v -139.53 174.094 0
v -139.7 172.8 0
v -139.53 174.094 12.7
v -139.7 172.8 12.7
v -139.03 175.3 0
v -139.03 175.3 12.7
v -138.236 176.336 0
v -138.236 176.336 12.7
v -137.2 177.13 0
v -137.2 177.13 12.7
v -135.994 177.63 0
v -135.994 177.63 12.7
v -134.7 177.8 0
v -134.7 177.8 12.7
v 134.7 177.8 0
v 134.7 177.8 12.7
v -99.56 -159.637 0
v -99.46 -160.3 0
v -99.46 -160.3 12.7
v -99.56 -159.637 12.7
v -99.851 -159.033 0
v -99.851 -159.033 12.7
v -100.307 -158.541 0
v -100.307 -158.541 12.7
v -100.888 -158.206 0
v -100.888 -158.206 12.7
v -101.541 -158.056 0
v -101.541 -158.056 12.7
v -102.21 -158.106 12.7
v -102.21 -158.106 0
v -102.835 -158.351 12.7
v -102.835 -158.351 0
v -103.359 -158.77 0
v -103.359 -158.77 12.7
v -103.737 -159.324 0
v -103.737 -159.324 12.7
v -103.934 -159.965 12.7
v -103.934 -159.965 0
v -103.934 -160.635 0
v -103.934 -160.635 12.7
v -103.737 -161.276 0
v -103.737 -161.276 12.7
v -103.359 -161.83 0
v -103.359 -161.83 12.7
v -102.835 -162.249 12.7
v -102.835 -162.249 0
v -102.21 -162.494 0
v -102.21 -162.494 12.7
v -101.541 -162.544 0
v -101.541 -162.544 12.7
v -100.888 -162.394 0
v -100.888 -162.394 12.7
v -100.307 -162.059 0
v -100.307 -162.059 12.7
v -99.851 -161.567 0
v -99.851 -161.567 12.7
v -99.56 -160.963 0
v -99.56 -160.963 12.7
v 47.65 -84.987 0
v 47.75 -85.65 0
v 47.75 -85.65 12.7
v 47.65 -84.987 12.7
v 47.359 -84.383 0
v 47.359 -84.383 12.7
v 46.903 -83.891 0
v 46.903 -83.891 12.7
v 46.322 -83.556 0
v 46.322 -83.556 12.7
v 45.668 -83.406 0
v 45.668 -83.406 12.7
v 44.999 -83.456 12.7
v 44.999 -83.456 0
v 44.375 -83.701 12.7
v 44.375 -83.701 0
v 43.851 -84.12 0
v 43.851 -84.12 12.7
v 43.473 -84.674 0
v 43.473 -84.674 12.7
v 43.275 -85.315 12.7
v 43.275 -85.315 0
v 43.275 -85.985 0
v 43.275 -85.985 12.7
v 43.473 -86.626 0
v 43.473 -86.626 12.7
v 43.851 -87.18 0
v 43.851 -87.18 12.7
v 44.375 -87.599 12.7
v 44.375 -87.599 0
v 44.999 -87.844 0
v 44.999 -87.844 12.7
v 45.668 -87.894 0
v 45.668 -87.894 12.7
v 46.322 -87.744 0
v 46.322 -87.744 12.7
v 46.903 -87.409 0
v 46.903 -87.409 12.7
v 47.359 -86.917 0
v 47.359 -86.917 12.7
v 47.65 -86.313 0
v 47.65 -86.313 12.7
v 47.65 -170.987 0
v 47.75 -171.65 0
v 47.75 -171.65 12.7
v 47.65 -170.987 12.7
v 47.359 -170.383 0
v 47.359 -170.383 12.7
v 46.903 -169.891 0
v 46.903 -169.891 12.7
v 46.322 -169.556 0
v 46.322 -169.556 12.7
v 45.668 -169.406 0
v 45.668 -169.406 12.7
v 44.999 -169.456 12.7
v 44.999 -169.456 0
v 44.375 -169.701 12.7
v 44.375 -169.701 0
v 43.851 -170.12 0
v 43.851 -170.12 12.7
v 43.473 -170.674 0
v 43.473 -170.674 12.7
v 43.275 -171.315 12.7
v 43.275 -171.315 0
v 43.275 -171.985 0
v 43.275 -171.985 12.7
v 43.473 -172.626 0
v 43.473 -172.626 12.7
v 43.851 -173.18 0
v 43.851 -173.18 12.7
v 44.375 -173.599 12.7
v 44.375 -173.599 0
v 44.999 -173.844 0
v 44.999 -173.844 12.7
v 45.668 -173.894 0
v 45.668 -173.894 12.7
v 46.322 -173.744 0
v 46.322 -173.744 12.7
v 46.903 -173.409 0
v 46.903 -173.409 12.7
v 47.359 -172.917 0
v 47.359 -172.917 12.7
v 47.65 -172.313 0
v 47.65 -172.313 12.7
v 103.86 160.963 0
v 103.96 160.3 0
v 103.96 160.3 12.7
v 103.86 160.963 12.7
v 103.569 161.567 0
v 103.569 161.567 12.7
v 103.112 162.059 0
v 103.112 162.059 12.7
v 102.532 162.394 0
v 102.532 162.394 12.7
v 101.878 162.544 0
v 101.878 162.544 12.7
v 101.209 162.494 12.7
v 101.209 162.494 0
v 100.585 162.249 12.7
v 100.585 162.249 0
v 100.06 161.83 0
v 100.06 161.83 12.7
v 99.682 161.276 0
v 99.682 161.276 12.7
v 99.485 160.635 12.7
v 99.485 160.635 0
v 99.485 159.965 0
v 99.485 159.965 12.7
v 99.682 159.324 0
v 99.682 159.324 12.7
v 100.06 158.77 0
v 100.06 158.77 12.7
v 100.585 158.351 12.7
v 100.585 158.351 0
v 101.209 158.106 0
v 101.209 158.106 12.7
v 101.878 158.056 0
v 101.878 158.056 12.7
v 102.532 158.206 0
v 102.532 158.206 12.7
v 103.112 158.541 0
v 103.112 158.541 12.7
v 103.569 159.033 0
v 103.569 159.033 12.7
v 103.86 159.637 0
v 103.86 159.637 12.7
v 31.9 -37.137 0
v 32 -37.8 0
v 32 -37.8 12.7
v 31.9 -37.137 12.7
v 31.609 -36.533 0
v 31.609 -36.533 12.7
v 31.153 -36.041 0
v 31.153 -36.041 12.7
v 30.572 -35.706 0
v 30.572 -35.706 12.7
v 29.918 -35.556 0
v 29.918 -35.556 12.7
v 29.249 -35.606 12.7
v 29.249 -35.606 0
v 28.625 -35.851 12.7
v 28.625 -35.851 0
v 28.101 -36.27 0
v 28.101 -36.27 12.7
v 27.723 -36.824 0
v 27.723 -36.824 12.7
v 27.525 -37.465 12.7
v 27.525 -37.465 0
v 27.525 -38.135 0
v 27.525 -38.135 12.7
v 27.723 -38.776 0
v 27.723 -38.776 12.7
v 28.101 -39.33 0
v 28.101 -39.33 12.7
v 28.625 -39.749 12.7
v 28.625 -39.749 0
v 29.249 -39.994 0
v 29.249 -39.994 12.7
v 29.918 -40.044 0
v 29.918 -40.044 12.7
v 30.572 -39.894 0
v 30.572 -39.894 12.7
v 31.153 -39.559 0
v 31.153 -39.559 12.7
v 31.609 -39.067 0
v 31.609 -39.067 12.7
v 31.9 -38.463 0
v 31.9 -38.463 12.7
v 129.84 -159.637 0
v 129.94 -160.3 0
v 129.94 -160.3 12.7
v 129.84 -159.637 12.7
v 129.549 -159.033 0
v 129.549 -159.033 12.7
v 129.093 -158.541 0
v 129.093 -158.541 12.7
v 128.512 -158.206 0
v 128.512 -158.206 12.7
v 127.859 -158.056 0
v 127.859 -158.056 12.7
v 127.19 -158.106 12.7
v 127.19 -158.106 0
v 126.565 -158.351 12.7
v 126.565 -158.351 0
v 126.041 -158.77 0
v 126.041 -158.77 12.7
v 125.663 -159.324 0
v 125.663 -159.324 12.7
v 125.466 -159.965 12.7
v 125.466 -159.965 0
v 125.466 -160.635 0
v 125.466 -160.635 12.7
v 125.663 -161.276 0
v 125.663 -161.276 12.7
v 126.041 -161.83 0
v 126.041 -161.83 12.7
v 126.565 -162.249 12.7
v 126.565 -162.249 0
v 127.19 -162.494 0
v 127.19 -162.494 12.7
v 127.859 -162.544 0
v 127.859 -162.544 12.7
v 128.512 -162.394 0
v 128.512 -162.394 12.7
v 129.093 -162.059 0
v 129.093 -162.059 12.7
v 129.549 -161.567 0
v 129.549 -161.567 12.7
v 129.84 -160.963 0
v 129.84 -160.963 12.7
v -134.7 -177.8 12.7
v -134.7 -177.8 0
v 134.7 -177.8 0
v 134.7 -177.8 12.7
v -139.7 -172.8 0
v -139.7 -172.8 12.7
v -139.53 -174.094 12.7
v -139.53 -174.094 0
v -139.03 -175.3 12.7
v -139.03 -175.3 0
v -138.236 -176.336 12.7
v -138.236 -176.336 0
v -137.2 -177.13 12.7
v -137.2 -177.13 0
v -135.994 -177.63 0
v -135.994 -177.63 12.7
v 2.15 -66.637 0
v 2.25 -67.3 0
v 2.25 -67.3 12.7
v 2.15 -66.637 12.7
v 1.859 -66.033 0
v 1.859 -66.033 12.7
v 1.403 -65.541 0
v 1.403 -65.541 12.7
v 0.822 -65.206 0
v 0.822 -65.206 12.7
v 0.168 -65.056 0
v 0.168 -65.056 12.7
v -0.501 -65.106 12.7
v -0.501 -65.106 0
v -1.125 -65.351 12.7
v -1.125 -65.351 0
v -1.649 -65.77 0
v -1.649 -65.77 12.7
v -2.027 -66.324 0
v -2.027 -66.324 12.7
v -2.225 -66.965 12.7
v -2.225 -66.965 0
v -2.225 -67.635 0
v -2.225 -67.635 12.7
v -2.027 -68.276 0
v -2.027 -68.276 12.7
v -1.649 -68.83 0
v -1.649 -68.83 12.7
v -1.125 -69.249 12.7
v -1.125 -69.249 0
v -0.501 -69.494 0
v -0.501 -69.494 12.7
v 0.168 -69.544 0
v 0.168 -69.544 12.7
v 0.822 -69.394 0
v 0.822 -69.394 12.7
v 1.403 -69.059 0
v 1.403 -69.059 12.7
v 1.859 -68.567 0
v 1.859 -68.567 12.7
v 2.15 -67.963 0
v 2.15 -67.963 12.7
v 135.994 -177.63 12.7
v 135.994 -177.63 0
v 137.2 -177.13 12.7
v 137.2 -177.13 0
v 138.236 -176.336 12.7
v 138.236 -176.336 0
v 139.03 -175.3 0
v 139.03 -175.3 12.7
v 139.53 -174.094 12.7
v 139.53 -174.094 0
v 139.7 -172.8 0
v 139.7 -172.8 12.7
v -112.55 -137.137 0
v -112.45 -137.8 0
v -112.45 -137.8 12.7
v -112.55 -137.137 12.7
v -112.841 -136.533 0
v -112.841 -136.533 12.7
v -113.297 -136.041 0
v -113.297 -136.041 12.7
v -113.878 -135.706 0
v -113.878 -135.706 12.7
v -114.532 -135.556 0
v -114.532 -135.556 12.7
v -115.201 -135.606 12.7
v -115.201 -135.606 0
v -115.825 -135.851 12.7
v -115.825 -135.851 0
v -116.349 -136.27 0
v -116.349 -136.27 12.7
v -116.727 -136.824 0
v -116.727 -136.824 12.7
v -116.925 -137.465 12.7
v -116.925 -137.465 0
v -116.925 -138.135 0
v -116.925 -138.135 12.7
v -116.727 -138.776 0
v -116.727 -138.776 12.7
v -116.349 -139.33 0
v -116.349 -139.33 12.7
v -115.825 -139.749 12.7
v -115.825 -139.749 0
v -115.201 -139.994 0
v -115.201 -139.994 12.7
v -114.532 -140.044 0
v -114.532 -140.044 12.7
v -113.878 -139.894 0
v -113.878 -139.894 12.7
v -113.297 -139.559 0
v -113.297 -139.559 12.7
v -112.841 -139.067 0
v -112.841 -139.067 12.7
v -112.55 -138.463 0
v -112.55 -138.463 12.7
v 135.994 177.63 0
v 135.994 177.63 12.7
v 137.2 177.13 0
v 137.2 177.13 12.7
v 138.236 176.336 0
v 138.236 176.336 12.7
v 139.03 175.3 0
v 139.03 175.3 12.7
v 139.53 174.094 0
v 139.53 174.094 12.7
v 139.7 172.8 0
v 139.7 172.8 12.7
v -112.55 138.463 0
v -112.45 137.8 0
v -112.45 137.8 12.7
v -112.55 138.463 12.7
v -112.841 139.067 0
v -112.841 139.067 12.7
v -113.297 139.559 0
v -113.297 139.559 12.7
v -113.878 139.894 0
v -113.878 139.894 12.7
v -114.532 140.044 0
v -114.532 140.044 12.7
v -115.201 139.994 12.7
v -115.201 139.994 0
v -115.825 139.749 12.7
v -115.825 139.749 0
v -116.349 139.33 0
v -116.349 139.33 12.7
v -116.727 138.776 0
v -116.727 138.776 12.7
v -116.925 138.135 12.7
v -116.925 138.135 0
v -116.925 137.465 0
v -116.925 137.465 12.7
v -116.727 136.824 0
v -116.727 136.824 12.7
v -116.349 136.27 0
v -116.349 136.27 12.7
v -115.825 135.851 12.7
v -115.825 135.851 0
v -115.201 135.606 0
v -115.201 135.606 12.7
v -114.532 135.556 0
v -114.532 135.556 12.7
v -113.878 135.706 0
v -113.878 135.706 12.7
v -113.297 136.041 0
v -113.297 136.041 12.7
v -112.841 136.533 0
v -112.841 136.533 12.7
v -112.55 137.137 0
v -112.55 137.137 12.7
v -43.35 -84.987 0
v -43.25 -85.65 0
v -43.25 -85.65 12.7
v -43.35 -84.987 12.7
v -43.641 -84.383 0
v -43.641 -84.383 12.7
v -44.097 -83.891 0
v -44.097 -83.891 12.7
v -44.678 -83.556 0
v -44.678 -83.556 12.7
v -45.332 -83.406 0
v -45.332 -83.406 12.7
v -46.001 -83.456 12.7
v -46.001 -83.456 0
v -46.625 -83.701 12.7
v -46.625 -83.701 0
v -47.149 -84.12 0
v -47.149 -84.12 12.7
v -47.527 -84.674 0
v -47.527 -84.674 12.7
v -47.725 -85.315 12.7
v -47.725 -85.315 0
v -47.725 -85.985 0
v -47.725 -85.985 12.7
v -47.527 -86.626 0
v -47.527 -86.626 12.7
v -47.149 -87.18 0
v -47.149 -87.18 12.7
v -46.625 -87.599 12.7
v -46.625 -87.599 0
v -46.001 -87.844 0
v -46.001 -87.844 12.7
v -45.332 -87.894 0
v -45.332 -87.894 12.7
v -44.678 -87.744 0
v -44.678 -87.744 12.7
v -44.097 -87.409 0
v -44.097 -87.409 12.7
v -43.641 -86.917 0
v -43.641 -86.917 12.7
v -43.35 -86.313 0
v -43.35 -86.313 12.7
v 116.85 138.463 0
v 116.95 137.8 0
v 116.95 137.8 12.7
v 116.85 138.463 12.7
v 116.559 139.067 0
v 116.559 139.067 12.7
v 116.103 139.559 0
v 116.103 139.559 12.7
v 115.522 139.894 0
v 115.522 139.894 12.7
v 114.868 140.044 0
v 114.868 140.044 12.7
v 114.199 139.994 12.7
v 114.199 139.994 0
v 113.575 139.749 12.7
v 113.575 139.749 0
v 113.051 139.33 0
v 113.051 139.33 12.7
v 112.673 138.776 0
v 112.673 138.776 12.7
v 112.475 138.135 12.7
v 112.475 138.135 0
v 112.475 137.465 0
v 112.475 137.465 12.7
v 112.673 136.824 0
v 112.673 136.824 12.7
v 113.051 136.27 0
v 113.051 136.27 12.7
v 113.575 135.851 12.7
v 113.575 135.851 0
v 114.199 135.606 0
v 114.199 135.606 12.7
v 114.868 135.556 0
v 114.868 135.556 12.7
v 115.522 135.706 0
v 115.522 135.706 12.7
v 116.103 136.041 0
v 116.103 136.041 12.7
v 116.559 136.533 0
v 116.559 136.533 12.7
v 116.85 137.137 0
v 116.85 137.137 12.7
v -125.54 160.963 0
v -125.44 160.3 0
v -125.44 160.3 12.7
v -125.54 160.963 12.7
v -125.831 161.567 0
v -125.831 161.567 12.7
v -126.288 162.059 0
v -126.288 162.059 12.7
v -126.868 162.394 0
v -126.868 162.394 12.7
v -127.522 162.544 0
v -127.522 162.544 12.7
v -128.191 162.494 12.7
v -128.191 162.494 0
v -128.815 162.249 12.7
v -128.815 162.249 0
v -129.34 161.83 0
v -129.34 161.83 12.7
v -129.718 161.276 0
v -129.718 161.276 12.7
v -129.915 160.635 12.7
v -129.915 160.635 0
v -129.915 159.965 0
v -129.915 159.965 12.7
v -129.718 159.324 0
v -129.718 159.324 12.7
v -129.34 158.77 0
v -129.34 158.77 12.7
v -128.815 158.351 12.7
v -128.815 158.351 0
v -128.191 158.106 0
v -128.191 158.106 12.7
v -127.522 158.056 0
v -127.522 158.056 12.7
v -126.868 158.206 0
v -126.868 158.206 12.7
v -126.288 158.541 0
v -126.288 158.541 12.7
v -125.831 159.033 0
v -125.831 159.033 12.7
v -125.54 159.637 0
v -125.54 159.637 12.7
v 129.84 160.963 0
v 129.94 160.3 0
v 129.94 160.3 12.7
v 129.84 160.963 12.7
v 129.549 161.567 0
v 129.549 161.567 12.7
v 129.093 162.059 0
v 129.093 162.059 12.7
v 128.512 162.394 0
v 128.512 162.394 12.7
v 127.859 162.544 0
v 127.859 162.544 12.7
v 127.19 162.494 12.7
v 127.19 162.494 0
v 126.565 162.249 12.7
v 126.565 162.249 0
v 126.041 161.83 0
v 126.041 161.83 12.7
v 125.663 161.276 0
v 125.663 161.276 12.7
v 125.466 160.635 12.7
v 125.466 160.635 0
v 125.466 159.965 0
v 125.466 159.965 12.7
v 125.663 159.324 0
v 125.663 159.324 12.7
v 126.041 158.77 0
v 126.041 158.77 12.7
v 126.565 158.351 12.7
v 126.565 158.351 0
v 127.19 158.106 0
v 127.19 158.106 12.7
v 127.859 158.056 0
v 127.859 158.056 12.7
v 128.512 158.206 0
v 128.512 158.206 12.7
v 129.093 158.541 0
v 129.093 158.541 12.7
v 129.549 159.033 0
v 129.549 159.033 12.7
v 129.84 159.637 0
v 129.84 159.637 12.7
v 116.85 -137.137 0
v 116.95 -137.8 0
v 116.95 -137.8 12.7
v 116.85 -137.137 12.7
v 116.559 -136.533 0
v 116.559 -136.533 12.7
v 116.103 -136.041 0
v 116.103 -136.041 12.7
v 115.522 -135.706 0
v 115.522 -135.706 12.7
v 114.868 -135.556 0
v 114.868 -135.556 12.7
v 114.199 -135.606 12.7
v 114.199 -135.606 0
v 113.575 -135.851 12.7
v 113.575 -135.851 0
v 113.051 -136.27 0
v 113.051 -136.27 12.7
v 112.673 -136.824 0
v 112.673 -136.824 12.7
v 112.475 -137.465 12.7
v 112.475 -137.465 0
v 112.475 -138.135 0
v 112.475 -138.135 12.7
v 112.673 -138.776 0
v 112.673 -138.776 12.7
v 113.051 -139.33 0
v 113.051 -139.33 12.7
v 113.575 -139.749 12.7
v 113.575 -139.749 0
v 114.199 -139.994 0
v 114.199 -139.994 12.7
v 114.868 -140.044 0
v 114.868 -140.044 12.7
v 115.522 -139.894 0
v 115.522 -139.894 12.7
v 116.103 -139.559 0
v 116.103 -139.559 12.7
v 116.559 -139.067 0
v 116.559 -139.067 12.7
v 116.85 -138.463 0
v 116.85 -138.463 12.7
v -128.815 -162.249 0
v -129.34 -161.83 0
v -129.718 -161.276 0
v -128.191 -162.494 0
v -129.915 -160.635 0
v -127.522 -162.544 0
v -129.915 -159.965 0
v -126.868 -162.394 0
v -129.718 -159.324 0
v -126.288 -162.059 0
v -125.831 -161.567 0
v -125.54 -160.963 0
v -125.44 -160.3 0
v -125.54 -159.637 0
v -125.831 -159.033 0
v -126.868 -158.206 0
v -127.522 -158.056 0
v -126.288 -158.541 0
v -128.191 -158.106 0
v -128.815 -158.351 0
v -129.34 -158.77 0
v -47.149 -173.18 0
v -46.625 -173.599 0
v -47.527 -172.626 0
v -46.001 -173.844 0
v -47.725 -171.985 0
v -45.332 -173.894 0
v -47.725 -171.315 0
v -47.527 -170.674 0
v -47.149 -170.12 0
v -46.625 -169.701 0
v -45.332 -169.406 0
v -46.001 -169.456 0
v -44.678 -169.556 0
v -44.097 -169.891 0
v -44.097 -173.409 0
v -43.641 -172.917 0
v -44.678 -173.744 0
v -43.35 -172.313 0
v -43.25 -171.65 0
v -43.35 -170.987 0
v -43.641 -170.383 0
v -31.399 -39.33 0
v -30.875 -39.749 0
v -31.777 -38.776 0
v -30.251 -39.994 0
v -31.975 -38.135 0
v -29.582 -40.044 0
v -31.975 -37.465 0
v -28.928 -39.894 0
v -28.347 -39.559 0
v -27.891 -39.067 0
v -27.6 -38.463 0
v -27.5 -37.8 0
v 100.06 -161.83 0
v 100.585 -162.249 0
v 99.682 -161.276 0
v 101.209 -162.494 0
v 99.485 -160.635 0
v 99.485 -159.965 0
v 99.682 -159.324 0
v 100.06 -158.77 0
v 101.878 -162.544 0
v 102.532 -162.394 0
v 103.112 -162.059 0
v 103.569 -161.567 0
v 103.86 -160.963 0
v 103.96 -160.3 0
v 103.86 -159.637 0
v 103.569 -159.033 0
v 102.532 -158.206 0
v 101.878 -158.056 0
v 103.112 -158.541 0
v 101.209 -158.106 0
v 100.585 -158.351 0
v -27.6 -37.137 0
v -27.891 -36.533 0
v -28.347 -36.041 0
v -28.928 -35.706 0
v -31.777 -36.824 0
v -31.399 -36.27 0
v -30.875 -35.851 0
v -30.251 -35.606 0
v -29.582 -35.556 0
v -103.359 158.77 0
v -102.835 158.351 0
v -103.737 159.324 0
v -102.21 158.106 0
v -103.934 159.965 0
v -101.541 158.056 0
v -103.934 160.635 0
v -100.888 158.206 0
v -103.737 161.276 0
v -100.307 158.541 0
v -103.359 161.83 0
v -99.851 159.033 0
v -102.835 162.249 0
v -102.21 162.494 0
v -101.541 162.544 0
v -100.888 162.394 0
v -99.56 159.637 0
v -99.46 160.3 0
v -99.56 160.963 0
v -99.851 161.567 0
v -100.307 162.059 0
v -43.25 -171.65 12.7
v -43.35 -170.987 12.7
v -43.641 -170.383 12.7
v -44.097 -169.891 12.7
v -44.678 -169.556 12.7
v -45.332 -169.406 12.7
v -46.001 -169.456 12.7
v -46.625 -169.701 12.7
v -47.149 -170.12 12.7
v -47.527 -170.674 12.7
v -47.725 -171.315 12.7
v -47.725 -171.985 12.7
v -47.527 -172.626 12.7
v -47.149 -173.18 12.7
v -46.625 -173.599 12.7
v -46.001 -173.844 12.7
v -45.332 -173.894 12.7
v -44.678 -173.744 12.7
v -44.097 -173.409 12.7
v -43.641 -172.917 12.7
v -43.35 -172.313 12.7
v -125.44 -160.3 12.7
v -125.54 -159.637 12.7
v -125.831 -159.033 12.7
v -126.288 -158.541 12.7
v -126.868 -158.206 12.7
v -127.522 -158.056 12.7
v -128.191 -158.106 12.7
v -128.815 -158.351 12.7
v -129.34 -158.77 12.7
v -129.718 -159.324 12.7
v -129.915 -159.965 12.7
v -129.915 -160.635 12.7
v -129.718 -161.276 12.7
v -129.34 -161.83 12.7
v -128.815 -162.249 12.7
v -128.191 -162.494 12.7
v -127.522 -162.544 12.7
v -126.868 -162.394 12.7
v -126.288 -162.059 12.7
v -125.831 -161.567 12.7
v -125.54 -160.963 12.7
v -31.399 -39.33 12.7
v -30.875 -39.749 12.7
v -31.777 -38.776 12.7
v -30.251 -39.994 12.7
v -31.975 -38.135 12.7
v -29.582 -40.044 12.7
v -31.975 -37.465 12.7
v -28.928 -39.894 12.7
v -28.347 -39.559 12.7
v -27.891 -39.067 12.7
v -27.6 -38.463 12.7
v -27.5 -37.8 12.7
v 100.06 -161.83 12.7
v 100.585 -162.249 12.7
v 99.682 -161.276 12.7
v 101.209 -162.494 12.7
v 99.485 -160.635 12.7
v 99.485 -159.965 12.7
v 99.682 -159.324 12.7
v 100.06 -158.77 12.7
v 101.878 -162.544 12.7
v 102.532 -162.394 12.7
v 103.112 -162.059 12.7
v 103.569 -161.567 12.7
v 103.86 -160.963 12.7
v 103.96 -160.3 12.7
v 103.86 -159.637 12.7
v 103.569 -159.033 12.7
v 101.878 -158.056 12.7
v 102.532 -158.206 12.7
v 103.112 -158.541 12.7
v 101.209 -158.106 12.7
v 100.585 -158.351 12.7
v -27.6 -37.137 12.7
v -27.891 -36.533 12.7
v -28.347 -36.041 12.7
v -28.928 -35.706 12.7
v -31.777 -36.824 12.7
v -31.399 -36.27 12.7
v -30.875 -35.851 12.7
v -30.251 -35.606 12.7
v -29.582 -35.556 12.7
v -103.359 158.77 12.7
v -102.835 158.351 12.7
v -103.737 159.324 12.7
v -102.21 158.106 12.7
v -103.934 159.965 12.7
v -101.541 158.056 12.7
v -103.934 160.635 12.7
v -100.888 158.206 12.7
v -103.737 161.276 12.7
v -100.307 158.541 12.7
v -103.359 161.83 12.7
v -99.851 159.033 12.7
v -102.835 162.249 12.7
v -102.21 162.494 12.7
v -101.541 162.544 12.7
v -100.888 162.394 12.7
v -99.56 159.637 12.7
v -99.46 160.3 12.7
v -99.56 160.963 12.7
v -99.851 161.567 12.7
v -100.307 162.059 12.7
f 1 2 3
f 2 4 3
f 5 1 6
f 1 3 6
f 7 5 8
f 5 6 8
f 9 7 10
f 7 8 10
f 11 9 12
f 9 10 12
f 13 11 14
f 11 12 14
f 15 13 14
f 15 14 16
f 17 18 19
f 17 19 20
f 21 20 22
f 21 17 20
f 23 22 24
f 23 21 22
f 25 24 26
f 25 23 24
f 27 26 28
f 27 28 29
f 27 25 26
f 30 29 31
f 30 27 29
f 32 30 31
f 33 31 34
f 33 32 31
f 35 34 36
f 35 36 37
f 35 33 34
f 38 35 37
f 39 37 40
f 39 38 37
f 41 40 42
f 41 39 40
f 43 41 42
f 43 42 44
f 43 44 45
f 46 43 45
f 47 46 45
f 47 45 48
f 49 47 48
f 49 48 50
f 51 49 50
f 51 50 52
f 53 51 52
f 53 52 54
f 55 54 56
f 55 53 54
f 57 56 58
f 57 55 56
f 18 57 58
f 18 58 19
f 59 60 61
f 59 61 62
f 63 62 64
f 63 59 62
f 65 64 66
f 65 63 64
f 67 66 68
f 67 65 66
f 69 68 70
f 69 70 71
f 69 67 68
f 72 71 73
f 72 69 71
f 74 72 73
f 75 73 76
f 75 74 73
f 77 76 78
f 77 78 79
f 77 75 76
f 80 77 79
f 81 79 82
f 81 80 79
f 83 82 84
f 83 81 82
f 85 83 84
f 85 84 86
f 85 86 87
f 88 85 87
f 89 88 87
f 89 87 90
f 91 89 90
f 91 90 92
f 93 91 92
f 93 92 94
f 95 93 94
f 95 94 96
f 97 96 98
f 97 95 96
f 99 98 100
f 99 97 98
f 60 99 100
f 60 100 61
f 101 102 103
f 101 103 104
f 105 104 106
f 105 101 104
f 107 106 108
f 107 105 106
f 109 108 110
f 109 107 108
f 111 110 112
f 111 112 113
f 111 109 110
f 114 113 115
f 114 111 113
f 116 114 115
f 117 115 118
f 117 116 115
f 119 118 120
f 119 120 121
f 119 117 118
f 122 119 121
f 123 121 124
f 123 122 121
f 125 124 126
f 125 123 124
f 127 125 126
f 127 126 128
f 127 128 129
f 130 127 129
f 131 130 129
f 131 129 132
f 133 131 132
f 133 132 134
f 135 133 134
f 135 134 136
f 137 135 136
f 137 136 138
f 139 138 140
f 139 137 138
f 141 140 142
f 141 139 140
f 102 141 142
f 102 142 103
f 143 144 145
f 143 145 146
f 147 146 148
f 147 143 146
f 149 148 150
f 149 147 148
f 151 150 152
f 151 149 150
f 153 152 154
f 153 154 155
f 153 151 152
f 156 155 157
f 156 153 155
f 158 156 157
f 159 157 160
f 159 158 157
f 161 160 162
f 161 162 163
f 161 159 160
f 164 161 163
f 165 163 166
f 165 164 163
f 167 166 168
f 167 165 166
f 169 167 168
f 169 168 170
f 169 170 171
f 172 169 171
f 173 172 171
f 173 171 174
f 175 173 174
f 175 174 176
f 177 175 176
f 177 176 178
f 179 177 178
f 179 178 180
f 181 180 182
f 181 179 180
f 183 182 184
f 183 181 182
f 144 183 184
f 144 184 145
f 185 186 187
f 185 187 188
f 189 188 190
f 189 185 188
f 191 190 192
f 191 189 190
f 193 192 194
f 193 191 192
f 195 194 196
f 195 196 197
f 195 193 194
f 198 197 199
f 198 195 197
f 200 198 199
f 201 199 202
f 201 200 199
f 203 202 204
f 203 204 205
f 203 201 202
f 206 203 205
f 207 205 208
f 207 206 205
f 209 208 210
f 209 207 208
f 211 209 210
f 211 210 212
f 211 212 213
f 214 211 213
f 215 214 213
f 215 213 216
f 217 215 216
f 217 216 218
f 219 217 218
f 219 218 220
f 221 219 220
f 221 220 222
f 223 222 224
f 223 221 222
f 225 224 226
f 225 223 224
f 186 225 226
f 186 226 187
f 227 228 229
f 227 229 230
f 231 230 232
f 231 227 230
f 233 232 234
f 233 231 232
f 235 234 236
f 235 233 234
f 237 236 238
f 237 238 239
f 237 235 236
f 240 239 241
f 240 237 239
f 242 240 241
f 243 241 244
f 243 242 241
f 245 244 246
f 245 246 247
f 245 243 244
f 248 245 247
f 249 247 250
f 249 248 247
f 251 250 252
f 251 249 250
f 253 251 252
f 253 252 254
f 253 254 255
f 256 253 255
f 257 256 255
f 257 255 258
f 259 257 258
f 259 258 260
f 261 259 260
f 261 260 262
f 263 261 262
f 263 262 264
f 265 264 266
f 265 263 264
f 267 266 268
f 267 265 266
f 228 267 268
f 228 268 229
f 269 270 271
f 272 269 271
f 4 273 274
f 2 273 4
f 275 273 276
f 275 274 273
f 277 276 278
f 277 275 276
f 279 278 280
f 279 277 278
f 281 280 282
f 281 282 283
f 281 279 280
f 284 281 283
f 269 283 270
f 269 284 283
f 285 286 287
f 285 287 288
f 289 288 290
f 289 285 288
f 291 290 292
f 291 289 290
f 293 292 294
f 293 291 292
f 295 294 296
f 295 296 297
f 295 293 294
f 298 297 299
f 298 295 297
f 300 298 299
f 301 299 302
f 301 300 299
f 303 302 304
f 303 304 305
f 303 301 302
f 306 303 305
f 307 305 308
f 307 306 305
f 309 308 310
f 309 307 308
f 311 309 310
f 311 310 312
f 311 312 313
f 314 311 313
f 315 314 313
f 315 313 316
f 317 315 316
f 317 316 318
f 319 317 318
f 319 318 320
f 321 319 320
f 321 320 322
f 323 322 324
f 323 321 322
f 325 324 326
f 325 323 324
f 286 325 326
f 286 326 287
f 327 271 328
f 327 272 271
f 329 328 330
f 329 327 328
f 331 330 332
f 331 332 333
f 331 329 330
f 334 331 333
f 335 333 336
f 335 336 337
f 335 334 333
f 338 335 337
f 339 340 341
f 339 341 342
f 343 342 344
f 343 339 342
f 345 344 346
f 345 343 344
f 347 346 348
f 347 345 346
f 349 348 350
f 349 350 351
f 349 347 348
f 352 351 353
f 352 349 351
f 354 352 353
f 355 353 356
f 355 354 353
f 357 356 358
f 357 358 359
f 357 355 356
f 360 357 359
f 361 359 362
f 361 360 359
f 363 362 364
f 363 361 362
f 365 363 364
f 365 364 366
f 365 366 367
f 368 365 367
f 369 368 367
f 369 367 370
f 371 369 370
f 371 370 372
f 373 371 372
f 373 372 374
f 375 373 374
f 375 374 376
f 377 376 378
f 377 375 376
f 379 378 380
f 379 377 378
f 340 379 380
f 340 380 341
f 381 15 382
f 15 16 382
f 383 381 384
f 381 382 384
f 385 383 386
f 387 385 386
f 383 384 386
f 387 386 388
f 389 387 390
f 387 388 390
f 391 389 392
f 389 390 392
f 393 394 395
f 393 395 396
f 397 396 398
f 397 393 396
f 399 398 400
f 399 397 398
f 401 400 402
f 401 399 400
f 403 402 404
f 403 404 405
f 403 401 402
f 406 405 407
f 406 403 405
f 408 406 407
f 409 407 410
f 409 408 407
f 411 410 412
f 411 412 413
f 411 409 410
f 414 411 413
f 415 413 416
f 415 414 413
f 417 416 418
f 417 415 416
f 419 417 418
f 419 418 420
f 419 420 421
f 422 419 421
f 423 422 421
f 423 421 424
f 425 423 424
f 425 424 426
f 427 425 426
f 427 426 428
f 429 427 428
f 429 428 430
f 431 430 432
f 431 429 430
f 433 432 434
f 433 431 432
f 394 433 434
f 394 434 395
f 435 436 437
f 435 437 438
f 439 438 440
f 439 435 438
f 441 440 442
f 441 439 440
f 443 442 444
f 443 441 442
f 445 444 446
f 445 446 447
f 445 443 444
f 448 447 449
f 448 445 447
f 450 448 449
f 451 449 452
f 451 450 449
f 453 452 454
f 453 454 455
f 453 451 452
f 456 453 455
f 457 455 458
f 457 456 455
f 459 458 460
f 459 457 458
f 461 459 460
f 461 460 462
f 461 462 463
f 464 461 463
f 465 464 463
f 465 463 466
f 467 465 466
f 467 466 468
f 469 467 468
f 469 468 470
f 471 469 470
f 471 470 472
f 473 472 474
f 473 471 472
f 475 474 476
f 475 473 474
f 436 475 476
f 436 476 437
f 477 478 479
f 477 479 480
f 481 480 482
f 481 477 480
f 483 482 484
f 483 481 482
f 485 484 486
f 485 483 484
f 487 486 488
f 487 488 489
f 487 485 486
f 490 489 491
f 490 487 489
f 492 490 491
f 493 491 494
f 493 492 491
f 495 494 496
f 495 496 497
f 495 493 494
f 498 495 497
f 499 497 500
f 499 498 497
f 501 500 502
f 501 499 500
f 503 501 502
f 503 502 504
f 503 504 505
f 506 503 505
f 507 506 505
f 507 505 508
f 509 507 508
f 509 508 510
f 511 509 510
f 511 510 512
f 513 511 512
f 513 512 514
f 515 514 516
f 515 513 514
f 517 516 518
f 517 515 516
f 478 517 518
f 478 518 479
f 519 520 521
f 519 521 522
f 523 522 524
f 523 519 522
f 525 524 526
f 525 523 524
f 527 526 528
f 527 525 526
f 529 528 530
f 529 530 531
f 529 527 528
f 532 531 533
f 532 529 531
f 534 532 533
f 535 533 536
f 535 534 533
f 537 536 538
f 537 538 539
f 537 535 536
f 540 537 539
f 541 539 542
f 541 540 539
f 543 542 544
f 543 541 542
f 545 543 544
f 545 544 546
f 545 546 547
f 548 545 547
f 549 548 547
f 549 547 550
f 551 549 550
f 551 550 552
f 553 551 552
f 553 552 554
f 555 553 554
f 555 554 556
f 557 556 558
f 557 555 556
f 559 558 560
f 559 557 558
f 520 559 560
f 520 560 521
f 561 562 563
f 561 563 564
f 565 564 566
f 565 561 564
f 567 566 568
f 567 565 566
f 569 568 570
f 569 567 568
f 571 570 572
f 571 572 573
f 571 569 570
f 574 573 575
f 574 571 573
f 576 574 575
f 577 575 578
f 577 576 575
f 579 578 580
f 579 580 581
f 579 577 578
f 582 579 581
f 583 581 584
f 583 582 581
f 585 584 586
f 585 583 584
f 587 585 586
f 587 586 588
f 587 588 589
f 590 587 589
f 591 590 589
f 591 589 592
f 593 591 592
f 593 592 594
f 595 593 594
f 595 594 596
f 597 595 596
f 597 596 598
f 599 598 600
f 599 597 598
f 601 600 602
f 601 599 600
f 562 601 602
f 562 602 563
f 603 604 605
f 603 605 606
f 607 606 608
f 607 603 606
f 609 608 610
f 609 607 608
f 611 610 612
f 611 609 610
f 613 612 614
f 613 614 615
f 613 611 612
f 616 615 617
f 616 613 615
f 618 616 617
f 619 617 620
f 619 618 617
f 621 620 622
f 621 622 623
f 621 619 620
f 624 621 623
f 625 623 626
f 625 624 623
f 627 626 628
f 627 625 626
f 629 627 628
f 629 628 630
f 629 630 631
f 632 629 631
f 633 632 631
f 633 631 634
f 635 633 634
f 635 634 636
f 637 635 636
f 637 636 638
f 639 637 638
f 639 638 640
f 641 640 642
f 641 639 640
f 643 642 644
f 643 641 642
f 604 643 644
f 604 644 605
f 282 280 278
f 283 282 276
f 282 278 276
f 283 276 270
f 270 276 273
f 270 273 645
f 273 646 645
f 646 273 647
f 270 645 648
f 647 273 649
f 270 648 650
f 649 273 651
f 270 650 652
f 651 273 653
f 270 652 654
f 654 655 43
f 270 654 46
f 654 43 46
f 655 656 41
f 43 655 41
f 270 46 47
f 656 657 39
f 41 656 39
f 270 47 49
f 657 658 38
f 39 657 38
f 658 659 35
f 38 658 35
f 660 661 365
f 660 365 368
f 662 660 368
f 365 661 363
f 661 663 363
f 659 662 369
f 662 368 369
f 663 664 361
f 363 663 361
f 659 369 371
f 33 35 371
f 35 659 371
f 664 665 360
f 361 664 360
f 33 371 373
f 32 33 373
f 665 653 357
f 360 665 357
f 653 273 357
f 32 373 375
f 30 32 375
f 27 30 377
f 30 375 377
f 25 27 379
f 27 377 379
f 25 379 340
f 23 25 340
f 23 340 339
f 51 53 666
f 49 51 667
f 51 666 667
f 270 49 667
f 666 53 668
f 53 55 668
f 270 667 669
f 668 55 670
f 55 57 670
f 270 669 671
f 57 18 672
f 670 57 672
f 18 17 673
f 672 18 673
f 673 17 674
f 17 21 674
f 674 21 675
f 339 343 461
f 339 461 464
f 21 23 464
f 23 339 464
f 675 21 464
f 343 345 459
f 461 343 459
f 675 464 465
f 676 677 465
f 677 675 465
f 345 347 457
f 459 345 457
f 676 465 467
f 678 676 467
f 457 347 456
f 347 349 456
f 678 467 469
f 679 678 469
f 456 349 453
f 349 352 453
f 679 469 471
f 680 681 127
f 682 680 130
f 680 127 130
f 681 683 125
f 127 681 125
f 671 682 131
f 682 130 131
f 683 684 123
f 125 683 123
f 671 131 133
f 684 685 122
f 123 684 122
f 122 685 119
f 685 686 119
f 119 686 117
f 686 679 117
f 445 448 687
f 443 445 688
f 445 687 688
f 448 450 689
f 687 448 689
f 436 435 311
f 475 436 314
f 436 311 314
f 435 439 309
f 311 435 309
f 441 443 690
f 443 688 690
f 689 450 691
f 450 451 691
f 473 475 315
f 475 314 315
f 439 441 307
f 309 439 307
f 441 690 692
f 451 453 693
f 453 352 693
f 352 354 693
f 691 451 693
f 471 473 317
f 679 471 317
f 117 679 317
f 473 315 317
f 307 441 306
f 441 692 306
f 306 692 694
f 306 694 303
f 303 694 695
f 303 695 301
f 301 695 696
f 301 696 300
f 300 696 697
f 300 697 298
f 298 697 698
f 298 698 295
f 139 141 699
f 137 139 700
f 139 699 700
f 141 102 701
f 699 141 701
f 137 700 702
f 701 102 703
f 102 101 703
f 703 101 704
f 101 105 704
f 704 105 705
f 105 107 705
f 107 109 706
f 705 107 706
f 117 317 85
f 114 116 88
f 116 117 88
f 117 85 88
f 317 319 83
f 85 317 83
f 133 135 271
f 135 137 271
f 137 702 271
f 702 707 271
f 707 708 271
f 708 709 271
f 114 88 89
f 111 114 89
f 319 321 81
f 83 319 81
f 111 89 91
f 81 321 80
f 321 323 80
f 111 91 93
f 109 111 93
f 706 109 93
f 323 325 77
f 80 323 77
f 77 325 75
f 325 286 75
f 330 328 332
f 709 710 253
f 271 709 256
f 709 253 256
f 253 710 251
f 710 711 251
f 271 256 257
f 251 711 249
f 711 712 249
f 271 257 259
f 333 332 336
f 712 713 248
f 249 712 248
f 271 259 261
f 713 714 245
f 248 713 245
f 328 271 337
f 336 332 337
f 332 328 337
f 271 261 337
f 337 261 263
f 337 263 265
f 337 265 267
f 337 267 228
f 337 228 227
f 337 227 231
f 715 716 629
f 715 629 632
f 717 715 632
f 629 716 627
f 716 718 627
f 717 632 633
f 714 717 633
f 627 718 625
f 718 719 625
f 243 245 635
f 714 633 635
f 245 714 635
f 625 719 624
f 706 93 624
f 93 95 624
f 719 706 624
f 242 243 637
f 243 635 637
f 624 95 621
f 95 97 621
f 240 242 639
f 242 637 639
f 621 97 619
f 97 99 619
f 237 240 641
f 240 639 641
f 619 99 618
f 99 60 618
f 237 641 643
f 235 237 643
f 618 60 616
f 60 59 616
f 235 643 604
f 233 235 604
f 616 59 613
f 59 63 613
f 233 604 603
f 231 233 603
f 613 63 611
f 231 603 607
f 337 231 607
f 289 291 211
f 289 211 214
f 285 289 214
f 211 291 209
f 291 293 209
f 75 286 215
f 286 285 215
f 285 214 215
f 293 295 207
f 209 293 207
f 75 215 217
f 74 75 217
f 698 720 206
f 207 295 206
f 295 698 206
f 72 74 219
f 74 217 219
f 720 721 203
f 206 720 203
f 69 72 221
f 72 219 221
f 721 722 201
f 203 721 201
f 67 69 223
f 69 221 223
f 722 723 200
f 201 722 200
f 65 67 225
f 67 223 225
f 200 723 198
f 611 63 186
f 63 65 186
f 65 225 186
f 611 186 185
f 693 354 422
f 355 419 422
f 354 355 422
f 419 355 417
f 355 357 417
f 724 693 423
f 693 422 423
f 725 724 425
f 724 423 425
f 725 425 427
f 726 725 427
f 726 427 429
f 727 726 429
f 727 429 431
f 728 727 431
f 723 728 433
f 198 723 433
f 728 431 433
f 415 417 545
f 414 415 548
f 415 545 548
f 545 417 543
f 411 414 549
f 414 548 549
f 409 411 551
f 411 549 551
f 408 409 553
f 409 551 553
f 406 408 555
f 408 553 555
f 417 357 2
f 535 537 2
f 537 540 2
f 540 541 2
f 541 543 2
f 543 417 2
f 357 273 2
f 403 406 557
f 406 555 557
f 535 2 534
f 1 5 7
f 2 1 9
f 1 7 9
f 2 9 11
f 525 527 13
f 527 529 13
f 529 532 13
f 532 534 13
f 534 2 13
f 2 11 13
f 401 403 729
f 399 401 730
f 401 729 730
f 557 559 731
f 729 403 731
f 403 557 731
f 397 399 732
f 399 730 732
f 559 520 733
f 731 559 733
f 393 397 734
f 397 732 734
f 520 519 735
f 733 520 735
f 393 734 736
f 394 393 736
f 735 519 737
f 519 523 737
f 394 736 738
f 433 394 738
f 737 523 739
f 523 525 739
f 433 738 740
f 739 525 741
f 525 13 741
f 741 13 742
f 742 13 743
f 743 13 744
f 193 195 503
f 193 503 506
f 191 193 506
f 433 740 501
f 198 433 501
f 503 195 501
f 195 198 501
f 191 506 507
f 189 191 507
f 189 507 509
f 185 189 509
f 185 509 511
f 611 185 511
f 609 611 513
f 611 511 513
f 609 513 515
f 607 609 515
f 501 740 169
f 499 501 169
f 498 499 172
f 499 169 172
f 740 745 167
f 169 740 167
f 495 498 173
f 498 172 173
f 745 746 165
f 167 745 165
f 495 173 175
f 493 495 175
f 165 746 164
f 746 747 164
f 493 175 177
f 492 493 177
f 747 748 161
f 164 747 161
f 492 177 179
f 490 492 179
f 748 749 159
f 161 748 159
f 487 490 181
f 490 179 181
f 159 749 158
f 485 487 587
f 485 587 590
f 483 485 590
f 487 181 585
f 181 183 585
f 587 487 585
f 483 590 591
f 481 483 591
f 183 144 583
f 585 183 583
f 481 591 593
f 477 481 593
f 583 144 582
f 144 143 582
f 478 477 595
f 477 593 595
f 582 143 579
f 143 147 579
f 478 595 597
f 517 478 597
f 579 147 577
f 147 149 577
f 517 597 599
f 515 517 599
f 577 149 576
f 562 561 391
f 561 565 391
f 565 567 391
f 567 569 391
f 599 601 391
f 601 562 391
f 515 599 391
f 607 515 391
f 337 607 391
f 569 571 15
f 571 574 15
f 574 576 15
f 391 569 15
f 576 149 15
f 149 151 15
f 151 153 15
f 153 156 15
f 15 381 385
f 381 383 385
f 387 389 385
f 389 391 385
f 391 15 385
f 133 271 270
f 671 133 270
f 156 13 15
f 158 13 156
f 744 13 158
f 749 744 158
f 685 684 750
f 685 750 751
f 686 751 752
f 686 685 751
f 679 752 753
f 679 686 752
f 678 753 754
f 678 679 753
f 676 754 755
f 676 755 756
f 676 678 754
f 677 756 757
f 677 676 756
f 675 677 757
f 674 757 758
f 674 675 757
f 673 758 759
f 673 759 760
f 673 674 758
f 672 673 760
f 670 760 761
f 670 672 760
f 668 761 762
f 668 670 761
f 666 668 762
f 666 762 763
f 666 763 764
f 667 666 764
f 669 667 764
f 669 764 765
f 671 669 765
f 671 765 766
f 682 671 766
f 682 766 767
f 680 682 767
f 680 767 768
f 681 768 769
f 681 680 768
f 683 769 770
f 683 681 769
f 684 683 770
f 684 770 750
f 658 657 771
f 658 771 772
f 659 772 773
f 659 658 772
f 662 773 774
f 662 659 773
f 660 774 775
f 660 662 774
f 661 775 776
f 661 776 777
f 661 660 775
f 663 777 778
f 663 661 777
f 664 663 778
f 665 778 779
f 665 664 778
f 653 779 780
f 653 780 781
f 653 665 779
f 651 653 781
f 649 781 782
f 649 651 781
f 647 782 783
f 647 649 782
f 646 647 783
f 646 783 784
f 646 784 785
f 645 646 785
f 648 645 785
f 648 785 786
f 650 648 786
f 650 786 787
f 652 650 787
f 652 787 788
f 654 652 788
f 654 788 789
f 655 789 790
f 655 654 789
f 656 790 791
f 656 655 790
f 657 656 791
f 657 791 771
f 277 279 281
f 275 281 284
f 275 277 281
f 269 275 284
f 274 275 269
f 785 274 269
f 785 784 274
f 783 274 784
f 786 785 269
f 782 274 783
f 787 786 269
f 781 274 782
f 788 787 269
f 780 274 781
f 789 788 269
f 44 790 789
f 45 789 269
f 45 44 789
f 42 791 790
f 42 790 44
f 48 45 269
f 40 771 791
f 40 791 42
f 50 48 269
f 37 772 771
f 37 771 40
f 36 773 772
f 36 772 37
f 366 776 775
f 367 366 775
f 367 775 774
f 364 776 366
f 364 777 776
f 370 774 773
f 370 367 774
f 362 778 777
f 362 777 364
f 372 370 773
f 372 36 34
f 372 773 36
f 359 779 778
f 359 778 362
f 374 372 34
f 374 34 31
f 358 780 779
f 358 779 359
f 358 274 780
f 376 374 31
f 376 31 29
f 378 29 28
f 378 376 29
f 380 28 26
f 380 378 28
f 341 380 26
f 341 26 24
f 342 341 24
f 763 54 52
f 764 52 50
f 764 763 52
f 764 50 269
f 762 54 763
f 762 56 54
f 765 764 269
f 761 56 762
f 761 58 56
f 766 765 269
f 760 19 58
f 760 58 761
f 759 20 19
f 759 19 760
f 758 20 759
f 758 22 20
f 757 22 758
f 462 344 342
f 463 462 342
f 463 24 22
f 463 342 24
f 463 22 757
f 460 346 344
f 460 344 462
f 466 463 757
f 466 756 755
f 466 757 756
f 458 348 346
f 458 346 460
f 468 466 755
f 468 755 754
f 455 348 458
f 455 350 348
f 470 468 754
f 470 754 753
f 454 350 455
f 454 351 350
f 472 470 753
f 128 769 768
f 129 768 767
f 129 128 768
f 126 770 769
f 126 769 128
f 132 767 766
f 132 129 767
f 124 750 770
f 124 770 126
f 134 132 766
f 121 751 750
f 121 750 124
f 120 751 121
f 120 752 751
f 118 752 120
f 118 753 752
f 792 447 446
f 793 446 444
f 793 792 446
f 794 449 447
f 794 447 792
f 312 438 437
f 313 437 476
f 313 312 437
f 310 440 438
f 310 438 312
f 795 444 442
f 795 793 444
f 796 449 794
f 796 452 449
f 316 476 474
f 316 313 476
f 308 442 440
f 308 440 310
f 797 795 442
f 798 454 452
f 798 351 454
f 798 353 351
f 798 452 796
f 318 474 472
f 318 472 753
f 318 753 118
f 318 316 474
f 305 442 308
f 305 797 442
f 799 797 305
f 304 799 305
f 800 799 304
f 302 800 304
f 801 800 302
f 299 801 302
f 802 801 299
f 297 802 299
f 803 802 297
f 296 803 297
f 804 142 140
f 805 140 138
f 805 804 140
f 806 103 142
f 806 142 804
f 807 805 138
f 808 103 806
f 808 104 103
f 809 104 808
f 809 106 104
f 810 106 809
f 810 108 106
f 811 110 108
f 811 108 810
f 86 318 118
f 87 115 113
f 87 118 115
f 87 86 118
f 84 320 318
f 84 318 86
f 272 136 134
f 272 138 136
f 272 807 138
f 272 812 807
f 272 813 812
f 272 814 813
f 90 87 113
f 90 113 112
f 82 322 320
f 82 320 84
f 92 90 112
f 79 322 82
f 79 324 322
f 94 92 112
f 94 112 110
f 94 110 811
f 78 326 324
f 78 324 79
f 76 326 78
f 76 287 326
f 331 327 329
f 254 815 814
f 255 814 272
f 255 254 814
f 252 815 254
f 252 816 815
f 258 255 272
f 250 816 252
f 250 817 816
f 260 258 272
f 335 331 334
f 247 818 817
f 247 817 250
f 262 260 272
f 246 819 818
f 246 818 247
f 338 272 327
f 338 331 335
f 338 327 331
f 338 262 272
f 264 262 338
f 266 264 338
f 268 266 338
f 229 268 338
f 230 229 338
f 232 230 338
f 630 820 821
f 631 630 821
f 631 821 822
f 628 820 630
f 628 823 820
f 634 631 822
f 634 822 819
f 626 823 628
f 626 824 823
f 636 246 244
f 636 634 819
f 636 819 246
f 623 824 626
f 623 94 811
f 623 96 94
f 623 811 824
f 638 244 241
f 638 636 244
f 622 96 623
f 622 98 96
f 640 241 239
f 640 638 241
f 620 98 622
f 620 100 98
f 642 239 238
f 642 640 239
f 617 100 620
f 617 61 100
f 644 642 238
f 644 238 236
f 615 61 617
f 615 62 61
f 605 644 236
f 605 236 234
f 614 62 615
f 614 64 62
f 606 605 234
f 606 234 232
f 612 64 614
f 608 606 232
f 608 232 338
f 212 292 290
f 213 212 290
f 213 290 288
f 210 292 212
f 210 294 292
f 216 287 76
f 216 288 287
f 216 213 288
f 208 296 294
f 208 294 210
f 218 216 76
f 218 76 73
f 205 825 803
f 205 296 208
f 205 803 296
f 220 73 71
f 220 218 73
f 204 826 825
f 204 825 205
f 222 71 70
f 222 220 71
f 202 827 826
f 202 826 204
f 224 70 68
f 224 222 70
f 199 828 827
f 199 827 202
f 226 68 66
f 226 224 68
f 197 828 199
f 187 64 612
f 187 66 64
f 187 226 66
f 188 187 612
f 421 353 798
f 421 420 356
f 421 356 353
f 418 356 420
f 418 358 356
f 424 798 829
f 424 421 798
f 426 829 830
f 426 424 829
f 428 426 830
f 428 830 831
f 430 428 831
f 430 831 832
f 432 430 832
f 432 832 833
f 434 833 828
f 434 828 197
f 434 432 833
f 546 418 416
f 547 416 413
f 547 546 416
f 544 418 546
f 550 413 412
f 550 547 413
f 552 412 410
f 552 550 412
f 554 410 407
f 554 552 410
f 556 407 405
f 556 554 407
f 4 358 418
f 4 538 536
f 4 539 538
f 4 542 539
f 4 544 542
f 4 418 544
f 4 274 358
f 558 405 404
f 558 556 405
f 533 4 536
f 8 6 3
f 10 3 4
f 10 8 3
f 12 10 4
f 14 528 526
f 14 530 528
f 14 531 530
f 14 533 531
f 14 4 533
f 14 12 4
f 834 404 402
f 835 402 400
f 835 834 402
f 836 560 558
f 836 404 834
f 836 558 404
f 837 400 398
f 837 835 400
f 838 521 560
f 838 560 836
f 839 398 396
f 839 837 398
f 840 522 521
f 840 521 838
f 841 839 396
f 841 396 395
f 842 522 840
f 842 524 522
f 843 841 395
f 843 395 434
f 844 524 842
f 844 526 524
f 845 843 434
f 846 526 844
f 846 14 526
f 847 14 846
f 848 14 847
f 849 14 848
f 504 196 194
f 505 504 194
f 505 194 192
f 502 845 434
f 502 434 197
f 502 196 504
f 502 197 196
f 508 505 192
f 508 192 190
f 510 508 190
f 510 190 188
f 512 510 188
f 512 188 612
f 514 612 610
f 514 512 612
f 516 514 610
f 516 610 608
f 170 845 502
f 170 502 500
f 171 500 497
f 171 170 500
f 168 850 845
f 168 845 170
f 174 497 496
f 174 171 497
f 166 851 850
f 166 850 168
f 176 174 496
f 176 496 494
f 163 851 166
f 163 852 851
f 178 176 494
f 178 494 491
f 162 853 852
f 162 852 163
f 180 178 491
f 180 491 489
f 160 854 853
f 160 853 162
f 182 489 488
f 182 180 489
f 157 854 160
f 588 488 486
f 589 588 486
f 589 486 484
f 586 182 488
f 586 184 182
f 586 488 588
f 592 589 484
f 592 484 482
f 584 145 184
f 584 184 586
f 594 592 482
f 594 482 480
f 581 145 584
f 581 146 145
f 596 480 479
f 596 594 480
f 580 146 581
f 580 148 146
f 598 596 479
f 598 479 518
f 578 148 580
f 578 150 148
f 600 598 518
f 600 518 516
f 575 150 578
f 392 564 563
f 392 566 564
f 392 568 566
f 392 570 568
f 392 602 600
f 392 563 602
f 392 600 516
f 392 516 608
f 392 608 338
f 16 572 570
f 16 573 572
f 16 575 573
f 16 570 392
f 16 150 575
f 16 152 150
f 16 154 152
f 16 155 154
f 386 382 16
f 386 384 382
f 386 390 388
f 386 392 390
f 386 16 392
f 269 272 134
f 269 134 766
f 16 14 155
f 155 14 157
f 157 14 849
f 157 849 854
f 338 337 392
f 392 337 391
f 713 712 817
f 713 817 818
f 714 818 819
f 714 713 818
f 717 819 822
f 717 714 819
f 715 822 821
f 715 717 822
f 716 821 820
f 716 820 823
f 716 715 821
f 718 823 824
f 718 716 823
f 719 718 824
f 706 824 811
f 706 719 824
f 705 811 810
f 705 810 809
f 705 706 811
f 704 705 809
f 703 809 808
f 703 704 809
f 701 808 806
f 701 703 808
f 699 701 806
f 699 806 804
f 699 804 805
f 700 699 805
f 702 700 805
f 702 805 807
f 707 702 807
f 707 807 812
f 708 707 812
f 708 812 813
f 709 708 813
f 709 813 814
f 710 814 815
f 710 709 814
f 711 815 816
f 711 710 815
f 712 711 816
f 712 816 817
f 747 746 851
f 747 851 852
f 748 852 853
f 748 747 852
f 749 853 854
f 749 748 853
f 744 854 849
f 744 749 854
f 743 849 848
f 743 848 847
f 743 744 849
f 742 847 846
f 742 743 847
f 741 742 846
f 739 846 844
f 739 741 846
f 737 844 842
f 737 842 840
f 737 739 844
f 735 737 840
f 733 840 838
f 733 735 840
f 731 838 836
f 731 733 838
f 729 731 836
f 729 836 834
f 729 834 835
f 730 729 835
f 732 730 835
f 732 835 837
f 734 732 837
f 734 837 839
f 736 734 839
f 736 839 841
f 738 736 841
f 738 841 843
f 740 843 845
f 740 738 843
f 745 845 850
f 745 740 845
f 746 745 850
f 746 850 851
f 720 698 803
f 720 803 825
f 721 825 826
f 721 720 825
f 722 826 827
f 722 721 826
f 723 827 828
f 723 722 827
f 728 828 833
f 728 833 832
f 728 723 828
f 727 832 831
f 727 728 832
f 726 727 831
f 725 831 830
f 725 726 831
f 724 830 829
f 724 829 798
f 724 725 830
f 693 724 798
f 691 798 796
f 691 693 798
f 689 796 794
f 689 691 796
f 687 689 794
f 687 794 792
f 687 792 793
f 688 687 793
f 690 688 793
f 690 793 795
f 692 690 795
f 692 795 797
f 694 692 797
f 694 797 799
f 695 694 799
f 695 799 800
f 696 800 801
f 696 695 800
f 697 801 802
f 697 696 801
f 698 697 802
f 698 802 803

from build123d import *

# Parameters (mm, degrees)
F0_W     = 279.4
F0_H     = 355.6
F0_R     = 2.25
F1_DEPTH = 12.7
F2_R     = 5


with BuildPart() as f1:
    # F0 (on Top) → F1 (new body)
    with BuildSketch(Plane.XY):
        Rectangle(F0_W, F0_H)
        with Locations((-127.690381, -160.3)):
            Circle(F0_R, mode=Mode.SUBTRACT)
        with Locations((-114.7, -137.8)):
            Circle(F0_R, mode=Mode.SUBTRACT)
        with Locations((-101.709619, -160.3)):
            Circle(F0_R, mode=Mode.SUBTRACT)
        with Locations((-45.5, -171.65)):
            Circle(F0_R, mode=Mode.SUBTRACT)
        with Locations((-45.5, -85.65)):
            Circle(F0_R, mode=Mode.SUBTRACT)
        with Locations((-29.75, -37.8)):
            Circle(F0_R, mode=Mode.SUBTRACT)
        with Locations((45.5, -171.65)):
            Circle(F0_R, mode=Mode.SUBTRACT)
        with Locations((101.709619, -160.3)):
            Circle(F0_R, mode=Mode.SUBTRACT)
        with Locations((127.690381, -160.3)):
            Circle(F0_R, mode=Mode.SUBTRACT)
        with Locations((114.7, -137.8)):
            Circle(F0_R, mode=Mode.SUBTRACT)
        with Locations((0, -67.3)):
            Circle(F0_R, mode=Mode.SUBTRACT)
        with Locations((45.5, -85.65)):
            Circle(F0_R, mode=Mode.SUBTRACT)
        with Locations((29.75, -37.8)):
            Circle(F0_R, mode=Mode.SUBTRACT)
        with Locations((-114.7, 137.8)):
            Circle(F0_R, mode=Mode.SUBTRACT)
        with Locations((-127.690381, 160.3)):
            Circle(F0_R, mode=Mode.SUBTRACT)
        with Locations((-101.709619, 160.3)):
            Circle(F0_R, mode=Mode.SUBTRACT)
        with Locations((101.709619, 160.3)):
            Circle(F0_R, mode=Mode.SUBTRACT)
        with Locations((114.7, 137.8)):
            Circle(F0_R, mode=Mode.SUBTRACT)
        with Locations((127.690381, 160.3)):
            Circle(F0_R, mode=Mode.SUBTRACT)
    extrude(amount=F1_DEPTH)

    # F2
    f2_edges = [f1.edges().sort_by_distance(p)[0] for p in [
        (-139.7, -177.8, 6.35),
        (139.7, -177.8, 6.35),
        (139.7, 177.8, 6.35),
        (-139.7, 177.8, 6.35),
    ]]
    fillet(f2_edges, radius=F2_R)


solid = f1.part
